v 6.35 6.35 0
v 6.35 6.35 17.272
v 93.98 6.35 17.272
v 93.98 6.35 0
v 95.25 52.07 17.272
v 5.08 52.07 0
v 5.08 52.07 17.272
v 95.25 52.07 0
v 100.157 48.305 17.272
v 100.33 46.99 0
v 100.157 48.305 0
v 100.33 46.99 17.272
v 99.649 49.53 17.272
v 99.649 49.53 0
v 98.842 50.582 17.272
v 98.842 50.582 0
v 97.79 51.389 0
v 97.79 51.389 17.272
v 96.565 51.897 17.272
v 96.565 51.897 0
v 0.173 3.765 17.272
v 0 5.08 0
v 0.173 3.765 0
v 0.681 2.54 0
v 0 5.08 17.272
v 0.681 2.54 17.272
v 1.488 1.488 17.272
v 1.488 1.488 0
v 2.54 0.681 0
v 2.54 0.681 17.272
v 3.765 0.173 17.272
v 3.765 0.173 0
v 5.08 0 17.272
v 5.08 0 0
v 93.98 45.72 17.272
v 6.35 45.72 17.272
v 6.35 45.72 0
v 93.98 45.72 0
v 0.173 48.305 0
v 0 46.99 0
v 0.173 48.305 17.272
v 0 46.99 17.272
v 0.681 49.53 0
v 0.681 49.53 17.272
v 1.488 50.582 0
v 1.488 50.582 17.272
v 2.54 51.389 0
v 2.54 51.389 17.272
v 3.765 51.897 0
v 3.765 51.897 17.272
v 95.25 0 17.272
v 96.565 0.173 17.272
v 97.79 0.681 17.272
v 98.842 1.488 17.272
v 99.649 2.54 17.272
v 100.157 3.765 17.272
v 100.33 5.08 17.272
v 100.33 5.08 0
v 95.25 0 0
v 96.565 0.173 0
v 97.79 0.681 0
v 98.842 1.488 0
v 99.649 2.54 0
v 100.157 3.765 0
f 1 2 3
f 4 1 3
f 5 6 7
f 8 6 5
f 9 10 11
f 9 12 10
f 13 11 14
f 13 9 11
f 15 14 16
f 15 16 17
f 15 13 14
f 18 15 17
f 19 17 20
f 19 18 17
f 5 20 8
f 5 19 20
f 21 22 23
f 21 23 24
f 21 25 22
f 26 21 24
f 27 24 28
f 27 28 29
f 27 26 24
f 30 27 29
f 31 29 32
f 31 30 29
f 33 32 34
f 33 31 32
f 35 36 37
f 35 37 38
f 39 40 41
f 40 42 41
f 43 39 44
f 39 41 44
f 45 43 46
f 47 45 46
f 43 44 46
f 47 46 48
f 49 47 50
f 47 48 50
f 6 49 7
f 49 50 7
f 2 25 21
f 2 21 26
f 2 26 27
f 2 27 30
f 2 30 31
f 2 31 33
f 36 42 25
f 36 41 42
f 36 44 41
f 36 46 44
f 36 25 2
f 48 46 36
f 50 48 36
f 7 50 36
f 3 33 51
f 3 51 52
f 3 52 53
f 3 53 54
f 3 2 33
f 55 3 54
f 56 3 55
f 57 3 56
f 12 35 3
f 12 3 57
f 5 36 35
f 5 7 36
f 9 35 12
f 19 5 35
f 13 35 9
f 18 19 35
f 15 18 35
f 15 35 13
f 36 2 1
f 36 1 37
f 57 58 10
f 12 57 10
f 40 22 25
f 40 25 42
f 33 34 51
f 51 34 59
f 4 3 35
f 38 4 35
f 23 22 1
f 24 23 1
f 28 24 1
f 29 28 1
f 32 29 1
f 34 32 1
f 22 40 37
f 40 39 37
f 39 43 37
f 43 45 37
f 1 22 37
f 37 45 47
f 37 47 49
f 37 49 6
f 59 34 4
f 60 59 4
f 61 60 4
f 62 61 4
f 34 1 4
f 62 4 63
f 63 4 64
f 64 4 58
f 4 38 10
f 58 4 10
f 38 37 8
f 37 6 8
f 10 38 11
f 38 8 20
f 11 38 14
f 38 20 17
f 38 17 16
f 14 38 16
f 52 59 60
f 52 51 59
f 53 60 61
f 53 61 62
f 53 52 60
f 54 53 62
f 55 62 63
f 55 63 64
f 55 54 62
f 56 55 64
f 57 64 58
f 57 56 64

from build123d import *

# Parameters (mm, degrees)
F0_W     = 100.33
F0_H     = 52.07
F1_DEPTH = 17.272
F2_R     = 5.08
F3_W     = 87.63
F3_H     = 39.37
F4_DEPTH = 25.4


with BuildPart() as f1:
    # F0 (on Top) → F1 (new body)
    with BuildSketch(Plane.XY):
        with Locations((50.165, 26.035)):
            Rectangle(F0_W, F0_H)
    extrude(amount=F1_DEPTH)

    # F2
    f2_edges = [f1.edges().sort_by_distance(p)[0] for p in [
        (0, 52.07, 8.636),
        (0, 0, 8.636),
        (100.33, 0, 8.636),
        (100.33, 52.07, 8.636),
    ]]
    fillet(f2_edges, radius=F2_R)

    # F3 (on face) → F4 (cut)
    with BuildSketch(Plane.XY.offset(17.272)):
        with Locations((50.165, 26.035)):
            Rectangle(F3_W, F3_H)
    extrude(amount=-F4_DEPTH, mode=Mode.SUBTRACT)


solid = f1.part
